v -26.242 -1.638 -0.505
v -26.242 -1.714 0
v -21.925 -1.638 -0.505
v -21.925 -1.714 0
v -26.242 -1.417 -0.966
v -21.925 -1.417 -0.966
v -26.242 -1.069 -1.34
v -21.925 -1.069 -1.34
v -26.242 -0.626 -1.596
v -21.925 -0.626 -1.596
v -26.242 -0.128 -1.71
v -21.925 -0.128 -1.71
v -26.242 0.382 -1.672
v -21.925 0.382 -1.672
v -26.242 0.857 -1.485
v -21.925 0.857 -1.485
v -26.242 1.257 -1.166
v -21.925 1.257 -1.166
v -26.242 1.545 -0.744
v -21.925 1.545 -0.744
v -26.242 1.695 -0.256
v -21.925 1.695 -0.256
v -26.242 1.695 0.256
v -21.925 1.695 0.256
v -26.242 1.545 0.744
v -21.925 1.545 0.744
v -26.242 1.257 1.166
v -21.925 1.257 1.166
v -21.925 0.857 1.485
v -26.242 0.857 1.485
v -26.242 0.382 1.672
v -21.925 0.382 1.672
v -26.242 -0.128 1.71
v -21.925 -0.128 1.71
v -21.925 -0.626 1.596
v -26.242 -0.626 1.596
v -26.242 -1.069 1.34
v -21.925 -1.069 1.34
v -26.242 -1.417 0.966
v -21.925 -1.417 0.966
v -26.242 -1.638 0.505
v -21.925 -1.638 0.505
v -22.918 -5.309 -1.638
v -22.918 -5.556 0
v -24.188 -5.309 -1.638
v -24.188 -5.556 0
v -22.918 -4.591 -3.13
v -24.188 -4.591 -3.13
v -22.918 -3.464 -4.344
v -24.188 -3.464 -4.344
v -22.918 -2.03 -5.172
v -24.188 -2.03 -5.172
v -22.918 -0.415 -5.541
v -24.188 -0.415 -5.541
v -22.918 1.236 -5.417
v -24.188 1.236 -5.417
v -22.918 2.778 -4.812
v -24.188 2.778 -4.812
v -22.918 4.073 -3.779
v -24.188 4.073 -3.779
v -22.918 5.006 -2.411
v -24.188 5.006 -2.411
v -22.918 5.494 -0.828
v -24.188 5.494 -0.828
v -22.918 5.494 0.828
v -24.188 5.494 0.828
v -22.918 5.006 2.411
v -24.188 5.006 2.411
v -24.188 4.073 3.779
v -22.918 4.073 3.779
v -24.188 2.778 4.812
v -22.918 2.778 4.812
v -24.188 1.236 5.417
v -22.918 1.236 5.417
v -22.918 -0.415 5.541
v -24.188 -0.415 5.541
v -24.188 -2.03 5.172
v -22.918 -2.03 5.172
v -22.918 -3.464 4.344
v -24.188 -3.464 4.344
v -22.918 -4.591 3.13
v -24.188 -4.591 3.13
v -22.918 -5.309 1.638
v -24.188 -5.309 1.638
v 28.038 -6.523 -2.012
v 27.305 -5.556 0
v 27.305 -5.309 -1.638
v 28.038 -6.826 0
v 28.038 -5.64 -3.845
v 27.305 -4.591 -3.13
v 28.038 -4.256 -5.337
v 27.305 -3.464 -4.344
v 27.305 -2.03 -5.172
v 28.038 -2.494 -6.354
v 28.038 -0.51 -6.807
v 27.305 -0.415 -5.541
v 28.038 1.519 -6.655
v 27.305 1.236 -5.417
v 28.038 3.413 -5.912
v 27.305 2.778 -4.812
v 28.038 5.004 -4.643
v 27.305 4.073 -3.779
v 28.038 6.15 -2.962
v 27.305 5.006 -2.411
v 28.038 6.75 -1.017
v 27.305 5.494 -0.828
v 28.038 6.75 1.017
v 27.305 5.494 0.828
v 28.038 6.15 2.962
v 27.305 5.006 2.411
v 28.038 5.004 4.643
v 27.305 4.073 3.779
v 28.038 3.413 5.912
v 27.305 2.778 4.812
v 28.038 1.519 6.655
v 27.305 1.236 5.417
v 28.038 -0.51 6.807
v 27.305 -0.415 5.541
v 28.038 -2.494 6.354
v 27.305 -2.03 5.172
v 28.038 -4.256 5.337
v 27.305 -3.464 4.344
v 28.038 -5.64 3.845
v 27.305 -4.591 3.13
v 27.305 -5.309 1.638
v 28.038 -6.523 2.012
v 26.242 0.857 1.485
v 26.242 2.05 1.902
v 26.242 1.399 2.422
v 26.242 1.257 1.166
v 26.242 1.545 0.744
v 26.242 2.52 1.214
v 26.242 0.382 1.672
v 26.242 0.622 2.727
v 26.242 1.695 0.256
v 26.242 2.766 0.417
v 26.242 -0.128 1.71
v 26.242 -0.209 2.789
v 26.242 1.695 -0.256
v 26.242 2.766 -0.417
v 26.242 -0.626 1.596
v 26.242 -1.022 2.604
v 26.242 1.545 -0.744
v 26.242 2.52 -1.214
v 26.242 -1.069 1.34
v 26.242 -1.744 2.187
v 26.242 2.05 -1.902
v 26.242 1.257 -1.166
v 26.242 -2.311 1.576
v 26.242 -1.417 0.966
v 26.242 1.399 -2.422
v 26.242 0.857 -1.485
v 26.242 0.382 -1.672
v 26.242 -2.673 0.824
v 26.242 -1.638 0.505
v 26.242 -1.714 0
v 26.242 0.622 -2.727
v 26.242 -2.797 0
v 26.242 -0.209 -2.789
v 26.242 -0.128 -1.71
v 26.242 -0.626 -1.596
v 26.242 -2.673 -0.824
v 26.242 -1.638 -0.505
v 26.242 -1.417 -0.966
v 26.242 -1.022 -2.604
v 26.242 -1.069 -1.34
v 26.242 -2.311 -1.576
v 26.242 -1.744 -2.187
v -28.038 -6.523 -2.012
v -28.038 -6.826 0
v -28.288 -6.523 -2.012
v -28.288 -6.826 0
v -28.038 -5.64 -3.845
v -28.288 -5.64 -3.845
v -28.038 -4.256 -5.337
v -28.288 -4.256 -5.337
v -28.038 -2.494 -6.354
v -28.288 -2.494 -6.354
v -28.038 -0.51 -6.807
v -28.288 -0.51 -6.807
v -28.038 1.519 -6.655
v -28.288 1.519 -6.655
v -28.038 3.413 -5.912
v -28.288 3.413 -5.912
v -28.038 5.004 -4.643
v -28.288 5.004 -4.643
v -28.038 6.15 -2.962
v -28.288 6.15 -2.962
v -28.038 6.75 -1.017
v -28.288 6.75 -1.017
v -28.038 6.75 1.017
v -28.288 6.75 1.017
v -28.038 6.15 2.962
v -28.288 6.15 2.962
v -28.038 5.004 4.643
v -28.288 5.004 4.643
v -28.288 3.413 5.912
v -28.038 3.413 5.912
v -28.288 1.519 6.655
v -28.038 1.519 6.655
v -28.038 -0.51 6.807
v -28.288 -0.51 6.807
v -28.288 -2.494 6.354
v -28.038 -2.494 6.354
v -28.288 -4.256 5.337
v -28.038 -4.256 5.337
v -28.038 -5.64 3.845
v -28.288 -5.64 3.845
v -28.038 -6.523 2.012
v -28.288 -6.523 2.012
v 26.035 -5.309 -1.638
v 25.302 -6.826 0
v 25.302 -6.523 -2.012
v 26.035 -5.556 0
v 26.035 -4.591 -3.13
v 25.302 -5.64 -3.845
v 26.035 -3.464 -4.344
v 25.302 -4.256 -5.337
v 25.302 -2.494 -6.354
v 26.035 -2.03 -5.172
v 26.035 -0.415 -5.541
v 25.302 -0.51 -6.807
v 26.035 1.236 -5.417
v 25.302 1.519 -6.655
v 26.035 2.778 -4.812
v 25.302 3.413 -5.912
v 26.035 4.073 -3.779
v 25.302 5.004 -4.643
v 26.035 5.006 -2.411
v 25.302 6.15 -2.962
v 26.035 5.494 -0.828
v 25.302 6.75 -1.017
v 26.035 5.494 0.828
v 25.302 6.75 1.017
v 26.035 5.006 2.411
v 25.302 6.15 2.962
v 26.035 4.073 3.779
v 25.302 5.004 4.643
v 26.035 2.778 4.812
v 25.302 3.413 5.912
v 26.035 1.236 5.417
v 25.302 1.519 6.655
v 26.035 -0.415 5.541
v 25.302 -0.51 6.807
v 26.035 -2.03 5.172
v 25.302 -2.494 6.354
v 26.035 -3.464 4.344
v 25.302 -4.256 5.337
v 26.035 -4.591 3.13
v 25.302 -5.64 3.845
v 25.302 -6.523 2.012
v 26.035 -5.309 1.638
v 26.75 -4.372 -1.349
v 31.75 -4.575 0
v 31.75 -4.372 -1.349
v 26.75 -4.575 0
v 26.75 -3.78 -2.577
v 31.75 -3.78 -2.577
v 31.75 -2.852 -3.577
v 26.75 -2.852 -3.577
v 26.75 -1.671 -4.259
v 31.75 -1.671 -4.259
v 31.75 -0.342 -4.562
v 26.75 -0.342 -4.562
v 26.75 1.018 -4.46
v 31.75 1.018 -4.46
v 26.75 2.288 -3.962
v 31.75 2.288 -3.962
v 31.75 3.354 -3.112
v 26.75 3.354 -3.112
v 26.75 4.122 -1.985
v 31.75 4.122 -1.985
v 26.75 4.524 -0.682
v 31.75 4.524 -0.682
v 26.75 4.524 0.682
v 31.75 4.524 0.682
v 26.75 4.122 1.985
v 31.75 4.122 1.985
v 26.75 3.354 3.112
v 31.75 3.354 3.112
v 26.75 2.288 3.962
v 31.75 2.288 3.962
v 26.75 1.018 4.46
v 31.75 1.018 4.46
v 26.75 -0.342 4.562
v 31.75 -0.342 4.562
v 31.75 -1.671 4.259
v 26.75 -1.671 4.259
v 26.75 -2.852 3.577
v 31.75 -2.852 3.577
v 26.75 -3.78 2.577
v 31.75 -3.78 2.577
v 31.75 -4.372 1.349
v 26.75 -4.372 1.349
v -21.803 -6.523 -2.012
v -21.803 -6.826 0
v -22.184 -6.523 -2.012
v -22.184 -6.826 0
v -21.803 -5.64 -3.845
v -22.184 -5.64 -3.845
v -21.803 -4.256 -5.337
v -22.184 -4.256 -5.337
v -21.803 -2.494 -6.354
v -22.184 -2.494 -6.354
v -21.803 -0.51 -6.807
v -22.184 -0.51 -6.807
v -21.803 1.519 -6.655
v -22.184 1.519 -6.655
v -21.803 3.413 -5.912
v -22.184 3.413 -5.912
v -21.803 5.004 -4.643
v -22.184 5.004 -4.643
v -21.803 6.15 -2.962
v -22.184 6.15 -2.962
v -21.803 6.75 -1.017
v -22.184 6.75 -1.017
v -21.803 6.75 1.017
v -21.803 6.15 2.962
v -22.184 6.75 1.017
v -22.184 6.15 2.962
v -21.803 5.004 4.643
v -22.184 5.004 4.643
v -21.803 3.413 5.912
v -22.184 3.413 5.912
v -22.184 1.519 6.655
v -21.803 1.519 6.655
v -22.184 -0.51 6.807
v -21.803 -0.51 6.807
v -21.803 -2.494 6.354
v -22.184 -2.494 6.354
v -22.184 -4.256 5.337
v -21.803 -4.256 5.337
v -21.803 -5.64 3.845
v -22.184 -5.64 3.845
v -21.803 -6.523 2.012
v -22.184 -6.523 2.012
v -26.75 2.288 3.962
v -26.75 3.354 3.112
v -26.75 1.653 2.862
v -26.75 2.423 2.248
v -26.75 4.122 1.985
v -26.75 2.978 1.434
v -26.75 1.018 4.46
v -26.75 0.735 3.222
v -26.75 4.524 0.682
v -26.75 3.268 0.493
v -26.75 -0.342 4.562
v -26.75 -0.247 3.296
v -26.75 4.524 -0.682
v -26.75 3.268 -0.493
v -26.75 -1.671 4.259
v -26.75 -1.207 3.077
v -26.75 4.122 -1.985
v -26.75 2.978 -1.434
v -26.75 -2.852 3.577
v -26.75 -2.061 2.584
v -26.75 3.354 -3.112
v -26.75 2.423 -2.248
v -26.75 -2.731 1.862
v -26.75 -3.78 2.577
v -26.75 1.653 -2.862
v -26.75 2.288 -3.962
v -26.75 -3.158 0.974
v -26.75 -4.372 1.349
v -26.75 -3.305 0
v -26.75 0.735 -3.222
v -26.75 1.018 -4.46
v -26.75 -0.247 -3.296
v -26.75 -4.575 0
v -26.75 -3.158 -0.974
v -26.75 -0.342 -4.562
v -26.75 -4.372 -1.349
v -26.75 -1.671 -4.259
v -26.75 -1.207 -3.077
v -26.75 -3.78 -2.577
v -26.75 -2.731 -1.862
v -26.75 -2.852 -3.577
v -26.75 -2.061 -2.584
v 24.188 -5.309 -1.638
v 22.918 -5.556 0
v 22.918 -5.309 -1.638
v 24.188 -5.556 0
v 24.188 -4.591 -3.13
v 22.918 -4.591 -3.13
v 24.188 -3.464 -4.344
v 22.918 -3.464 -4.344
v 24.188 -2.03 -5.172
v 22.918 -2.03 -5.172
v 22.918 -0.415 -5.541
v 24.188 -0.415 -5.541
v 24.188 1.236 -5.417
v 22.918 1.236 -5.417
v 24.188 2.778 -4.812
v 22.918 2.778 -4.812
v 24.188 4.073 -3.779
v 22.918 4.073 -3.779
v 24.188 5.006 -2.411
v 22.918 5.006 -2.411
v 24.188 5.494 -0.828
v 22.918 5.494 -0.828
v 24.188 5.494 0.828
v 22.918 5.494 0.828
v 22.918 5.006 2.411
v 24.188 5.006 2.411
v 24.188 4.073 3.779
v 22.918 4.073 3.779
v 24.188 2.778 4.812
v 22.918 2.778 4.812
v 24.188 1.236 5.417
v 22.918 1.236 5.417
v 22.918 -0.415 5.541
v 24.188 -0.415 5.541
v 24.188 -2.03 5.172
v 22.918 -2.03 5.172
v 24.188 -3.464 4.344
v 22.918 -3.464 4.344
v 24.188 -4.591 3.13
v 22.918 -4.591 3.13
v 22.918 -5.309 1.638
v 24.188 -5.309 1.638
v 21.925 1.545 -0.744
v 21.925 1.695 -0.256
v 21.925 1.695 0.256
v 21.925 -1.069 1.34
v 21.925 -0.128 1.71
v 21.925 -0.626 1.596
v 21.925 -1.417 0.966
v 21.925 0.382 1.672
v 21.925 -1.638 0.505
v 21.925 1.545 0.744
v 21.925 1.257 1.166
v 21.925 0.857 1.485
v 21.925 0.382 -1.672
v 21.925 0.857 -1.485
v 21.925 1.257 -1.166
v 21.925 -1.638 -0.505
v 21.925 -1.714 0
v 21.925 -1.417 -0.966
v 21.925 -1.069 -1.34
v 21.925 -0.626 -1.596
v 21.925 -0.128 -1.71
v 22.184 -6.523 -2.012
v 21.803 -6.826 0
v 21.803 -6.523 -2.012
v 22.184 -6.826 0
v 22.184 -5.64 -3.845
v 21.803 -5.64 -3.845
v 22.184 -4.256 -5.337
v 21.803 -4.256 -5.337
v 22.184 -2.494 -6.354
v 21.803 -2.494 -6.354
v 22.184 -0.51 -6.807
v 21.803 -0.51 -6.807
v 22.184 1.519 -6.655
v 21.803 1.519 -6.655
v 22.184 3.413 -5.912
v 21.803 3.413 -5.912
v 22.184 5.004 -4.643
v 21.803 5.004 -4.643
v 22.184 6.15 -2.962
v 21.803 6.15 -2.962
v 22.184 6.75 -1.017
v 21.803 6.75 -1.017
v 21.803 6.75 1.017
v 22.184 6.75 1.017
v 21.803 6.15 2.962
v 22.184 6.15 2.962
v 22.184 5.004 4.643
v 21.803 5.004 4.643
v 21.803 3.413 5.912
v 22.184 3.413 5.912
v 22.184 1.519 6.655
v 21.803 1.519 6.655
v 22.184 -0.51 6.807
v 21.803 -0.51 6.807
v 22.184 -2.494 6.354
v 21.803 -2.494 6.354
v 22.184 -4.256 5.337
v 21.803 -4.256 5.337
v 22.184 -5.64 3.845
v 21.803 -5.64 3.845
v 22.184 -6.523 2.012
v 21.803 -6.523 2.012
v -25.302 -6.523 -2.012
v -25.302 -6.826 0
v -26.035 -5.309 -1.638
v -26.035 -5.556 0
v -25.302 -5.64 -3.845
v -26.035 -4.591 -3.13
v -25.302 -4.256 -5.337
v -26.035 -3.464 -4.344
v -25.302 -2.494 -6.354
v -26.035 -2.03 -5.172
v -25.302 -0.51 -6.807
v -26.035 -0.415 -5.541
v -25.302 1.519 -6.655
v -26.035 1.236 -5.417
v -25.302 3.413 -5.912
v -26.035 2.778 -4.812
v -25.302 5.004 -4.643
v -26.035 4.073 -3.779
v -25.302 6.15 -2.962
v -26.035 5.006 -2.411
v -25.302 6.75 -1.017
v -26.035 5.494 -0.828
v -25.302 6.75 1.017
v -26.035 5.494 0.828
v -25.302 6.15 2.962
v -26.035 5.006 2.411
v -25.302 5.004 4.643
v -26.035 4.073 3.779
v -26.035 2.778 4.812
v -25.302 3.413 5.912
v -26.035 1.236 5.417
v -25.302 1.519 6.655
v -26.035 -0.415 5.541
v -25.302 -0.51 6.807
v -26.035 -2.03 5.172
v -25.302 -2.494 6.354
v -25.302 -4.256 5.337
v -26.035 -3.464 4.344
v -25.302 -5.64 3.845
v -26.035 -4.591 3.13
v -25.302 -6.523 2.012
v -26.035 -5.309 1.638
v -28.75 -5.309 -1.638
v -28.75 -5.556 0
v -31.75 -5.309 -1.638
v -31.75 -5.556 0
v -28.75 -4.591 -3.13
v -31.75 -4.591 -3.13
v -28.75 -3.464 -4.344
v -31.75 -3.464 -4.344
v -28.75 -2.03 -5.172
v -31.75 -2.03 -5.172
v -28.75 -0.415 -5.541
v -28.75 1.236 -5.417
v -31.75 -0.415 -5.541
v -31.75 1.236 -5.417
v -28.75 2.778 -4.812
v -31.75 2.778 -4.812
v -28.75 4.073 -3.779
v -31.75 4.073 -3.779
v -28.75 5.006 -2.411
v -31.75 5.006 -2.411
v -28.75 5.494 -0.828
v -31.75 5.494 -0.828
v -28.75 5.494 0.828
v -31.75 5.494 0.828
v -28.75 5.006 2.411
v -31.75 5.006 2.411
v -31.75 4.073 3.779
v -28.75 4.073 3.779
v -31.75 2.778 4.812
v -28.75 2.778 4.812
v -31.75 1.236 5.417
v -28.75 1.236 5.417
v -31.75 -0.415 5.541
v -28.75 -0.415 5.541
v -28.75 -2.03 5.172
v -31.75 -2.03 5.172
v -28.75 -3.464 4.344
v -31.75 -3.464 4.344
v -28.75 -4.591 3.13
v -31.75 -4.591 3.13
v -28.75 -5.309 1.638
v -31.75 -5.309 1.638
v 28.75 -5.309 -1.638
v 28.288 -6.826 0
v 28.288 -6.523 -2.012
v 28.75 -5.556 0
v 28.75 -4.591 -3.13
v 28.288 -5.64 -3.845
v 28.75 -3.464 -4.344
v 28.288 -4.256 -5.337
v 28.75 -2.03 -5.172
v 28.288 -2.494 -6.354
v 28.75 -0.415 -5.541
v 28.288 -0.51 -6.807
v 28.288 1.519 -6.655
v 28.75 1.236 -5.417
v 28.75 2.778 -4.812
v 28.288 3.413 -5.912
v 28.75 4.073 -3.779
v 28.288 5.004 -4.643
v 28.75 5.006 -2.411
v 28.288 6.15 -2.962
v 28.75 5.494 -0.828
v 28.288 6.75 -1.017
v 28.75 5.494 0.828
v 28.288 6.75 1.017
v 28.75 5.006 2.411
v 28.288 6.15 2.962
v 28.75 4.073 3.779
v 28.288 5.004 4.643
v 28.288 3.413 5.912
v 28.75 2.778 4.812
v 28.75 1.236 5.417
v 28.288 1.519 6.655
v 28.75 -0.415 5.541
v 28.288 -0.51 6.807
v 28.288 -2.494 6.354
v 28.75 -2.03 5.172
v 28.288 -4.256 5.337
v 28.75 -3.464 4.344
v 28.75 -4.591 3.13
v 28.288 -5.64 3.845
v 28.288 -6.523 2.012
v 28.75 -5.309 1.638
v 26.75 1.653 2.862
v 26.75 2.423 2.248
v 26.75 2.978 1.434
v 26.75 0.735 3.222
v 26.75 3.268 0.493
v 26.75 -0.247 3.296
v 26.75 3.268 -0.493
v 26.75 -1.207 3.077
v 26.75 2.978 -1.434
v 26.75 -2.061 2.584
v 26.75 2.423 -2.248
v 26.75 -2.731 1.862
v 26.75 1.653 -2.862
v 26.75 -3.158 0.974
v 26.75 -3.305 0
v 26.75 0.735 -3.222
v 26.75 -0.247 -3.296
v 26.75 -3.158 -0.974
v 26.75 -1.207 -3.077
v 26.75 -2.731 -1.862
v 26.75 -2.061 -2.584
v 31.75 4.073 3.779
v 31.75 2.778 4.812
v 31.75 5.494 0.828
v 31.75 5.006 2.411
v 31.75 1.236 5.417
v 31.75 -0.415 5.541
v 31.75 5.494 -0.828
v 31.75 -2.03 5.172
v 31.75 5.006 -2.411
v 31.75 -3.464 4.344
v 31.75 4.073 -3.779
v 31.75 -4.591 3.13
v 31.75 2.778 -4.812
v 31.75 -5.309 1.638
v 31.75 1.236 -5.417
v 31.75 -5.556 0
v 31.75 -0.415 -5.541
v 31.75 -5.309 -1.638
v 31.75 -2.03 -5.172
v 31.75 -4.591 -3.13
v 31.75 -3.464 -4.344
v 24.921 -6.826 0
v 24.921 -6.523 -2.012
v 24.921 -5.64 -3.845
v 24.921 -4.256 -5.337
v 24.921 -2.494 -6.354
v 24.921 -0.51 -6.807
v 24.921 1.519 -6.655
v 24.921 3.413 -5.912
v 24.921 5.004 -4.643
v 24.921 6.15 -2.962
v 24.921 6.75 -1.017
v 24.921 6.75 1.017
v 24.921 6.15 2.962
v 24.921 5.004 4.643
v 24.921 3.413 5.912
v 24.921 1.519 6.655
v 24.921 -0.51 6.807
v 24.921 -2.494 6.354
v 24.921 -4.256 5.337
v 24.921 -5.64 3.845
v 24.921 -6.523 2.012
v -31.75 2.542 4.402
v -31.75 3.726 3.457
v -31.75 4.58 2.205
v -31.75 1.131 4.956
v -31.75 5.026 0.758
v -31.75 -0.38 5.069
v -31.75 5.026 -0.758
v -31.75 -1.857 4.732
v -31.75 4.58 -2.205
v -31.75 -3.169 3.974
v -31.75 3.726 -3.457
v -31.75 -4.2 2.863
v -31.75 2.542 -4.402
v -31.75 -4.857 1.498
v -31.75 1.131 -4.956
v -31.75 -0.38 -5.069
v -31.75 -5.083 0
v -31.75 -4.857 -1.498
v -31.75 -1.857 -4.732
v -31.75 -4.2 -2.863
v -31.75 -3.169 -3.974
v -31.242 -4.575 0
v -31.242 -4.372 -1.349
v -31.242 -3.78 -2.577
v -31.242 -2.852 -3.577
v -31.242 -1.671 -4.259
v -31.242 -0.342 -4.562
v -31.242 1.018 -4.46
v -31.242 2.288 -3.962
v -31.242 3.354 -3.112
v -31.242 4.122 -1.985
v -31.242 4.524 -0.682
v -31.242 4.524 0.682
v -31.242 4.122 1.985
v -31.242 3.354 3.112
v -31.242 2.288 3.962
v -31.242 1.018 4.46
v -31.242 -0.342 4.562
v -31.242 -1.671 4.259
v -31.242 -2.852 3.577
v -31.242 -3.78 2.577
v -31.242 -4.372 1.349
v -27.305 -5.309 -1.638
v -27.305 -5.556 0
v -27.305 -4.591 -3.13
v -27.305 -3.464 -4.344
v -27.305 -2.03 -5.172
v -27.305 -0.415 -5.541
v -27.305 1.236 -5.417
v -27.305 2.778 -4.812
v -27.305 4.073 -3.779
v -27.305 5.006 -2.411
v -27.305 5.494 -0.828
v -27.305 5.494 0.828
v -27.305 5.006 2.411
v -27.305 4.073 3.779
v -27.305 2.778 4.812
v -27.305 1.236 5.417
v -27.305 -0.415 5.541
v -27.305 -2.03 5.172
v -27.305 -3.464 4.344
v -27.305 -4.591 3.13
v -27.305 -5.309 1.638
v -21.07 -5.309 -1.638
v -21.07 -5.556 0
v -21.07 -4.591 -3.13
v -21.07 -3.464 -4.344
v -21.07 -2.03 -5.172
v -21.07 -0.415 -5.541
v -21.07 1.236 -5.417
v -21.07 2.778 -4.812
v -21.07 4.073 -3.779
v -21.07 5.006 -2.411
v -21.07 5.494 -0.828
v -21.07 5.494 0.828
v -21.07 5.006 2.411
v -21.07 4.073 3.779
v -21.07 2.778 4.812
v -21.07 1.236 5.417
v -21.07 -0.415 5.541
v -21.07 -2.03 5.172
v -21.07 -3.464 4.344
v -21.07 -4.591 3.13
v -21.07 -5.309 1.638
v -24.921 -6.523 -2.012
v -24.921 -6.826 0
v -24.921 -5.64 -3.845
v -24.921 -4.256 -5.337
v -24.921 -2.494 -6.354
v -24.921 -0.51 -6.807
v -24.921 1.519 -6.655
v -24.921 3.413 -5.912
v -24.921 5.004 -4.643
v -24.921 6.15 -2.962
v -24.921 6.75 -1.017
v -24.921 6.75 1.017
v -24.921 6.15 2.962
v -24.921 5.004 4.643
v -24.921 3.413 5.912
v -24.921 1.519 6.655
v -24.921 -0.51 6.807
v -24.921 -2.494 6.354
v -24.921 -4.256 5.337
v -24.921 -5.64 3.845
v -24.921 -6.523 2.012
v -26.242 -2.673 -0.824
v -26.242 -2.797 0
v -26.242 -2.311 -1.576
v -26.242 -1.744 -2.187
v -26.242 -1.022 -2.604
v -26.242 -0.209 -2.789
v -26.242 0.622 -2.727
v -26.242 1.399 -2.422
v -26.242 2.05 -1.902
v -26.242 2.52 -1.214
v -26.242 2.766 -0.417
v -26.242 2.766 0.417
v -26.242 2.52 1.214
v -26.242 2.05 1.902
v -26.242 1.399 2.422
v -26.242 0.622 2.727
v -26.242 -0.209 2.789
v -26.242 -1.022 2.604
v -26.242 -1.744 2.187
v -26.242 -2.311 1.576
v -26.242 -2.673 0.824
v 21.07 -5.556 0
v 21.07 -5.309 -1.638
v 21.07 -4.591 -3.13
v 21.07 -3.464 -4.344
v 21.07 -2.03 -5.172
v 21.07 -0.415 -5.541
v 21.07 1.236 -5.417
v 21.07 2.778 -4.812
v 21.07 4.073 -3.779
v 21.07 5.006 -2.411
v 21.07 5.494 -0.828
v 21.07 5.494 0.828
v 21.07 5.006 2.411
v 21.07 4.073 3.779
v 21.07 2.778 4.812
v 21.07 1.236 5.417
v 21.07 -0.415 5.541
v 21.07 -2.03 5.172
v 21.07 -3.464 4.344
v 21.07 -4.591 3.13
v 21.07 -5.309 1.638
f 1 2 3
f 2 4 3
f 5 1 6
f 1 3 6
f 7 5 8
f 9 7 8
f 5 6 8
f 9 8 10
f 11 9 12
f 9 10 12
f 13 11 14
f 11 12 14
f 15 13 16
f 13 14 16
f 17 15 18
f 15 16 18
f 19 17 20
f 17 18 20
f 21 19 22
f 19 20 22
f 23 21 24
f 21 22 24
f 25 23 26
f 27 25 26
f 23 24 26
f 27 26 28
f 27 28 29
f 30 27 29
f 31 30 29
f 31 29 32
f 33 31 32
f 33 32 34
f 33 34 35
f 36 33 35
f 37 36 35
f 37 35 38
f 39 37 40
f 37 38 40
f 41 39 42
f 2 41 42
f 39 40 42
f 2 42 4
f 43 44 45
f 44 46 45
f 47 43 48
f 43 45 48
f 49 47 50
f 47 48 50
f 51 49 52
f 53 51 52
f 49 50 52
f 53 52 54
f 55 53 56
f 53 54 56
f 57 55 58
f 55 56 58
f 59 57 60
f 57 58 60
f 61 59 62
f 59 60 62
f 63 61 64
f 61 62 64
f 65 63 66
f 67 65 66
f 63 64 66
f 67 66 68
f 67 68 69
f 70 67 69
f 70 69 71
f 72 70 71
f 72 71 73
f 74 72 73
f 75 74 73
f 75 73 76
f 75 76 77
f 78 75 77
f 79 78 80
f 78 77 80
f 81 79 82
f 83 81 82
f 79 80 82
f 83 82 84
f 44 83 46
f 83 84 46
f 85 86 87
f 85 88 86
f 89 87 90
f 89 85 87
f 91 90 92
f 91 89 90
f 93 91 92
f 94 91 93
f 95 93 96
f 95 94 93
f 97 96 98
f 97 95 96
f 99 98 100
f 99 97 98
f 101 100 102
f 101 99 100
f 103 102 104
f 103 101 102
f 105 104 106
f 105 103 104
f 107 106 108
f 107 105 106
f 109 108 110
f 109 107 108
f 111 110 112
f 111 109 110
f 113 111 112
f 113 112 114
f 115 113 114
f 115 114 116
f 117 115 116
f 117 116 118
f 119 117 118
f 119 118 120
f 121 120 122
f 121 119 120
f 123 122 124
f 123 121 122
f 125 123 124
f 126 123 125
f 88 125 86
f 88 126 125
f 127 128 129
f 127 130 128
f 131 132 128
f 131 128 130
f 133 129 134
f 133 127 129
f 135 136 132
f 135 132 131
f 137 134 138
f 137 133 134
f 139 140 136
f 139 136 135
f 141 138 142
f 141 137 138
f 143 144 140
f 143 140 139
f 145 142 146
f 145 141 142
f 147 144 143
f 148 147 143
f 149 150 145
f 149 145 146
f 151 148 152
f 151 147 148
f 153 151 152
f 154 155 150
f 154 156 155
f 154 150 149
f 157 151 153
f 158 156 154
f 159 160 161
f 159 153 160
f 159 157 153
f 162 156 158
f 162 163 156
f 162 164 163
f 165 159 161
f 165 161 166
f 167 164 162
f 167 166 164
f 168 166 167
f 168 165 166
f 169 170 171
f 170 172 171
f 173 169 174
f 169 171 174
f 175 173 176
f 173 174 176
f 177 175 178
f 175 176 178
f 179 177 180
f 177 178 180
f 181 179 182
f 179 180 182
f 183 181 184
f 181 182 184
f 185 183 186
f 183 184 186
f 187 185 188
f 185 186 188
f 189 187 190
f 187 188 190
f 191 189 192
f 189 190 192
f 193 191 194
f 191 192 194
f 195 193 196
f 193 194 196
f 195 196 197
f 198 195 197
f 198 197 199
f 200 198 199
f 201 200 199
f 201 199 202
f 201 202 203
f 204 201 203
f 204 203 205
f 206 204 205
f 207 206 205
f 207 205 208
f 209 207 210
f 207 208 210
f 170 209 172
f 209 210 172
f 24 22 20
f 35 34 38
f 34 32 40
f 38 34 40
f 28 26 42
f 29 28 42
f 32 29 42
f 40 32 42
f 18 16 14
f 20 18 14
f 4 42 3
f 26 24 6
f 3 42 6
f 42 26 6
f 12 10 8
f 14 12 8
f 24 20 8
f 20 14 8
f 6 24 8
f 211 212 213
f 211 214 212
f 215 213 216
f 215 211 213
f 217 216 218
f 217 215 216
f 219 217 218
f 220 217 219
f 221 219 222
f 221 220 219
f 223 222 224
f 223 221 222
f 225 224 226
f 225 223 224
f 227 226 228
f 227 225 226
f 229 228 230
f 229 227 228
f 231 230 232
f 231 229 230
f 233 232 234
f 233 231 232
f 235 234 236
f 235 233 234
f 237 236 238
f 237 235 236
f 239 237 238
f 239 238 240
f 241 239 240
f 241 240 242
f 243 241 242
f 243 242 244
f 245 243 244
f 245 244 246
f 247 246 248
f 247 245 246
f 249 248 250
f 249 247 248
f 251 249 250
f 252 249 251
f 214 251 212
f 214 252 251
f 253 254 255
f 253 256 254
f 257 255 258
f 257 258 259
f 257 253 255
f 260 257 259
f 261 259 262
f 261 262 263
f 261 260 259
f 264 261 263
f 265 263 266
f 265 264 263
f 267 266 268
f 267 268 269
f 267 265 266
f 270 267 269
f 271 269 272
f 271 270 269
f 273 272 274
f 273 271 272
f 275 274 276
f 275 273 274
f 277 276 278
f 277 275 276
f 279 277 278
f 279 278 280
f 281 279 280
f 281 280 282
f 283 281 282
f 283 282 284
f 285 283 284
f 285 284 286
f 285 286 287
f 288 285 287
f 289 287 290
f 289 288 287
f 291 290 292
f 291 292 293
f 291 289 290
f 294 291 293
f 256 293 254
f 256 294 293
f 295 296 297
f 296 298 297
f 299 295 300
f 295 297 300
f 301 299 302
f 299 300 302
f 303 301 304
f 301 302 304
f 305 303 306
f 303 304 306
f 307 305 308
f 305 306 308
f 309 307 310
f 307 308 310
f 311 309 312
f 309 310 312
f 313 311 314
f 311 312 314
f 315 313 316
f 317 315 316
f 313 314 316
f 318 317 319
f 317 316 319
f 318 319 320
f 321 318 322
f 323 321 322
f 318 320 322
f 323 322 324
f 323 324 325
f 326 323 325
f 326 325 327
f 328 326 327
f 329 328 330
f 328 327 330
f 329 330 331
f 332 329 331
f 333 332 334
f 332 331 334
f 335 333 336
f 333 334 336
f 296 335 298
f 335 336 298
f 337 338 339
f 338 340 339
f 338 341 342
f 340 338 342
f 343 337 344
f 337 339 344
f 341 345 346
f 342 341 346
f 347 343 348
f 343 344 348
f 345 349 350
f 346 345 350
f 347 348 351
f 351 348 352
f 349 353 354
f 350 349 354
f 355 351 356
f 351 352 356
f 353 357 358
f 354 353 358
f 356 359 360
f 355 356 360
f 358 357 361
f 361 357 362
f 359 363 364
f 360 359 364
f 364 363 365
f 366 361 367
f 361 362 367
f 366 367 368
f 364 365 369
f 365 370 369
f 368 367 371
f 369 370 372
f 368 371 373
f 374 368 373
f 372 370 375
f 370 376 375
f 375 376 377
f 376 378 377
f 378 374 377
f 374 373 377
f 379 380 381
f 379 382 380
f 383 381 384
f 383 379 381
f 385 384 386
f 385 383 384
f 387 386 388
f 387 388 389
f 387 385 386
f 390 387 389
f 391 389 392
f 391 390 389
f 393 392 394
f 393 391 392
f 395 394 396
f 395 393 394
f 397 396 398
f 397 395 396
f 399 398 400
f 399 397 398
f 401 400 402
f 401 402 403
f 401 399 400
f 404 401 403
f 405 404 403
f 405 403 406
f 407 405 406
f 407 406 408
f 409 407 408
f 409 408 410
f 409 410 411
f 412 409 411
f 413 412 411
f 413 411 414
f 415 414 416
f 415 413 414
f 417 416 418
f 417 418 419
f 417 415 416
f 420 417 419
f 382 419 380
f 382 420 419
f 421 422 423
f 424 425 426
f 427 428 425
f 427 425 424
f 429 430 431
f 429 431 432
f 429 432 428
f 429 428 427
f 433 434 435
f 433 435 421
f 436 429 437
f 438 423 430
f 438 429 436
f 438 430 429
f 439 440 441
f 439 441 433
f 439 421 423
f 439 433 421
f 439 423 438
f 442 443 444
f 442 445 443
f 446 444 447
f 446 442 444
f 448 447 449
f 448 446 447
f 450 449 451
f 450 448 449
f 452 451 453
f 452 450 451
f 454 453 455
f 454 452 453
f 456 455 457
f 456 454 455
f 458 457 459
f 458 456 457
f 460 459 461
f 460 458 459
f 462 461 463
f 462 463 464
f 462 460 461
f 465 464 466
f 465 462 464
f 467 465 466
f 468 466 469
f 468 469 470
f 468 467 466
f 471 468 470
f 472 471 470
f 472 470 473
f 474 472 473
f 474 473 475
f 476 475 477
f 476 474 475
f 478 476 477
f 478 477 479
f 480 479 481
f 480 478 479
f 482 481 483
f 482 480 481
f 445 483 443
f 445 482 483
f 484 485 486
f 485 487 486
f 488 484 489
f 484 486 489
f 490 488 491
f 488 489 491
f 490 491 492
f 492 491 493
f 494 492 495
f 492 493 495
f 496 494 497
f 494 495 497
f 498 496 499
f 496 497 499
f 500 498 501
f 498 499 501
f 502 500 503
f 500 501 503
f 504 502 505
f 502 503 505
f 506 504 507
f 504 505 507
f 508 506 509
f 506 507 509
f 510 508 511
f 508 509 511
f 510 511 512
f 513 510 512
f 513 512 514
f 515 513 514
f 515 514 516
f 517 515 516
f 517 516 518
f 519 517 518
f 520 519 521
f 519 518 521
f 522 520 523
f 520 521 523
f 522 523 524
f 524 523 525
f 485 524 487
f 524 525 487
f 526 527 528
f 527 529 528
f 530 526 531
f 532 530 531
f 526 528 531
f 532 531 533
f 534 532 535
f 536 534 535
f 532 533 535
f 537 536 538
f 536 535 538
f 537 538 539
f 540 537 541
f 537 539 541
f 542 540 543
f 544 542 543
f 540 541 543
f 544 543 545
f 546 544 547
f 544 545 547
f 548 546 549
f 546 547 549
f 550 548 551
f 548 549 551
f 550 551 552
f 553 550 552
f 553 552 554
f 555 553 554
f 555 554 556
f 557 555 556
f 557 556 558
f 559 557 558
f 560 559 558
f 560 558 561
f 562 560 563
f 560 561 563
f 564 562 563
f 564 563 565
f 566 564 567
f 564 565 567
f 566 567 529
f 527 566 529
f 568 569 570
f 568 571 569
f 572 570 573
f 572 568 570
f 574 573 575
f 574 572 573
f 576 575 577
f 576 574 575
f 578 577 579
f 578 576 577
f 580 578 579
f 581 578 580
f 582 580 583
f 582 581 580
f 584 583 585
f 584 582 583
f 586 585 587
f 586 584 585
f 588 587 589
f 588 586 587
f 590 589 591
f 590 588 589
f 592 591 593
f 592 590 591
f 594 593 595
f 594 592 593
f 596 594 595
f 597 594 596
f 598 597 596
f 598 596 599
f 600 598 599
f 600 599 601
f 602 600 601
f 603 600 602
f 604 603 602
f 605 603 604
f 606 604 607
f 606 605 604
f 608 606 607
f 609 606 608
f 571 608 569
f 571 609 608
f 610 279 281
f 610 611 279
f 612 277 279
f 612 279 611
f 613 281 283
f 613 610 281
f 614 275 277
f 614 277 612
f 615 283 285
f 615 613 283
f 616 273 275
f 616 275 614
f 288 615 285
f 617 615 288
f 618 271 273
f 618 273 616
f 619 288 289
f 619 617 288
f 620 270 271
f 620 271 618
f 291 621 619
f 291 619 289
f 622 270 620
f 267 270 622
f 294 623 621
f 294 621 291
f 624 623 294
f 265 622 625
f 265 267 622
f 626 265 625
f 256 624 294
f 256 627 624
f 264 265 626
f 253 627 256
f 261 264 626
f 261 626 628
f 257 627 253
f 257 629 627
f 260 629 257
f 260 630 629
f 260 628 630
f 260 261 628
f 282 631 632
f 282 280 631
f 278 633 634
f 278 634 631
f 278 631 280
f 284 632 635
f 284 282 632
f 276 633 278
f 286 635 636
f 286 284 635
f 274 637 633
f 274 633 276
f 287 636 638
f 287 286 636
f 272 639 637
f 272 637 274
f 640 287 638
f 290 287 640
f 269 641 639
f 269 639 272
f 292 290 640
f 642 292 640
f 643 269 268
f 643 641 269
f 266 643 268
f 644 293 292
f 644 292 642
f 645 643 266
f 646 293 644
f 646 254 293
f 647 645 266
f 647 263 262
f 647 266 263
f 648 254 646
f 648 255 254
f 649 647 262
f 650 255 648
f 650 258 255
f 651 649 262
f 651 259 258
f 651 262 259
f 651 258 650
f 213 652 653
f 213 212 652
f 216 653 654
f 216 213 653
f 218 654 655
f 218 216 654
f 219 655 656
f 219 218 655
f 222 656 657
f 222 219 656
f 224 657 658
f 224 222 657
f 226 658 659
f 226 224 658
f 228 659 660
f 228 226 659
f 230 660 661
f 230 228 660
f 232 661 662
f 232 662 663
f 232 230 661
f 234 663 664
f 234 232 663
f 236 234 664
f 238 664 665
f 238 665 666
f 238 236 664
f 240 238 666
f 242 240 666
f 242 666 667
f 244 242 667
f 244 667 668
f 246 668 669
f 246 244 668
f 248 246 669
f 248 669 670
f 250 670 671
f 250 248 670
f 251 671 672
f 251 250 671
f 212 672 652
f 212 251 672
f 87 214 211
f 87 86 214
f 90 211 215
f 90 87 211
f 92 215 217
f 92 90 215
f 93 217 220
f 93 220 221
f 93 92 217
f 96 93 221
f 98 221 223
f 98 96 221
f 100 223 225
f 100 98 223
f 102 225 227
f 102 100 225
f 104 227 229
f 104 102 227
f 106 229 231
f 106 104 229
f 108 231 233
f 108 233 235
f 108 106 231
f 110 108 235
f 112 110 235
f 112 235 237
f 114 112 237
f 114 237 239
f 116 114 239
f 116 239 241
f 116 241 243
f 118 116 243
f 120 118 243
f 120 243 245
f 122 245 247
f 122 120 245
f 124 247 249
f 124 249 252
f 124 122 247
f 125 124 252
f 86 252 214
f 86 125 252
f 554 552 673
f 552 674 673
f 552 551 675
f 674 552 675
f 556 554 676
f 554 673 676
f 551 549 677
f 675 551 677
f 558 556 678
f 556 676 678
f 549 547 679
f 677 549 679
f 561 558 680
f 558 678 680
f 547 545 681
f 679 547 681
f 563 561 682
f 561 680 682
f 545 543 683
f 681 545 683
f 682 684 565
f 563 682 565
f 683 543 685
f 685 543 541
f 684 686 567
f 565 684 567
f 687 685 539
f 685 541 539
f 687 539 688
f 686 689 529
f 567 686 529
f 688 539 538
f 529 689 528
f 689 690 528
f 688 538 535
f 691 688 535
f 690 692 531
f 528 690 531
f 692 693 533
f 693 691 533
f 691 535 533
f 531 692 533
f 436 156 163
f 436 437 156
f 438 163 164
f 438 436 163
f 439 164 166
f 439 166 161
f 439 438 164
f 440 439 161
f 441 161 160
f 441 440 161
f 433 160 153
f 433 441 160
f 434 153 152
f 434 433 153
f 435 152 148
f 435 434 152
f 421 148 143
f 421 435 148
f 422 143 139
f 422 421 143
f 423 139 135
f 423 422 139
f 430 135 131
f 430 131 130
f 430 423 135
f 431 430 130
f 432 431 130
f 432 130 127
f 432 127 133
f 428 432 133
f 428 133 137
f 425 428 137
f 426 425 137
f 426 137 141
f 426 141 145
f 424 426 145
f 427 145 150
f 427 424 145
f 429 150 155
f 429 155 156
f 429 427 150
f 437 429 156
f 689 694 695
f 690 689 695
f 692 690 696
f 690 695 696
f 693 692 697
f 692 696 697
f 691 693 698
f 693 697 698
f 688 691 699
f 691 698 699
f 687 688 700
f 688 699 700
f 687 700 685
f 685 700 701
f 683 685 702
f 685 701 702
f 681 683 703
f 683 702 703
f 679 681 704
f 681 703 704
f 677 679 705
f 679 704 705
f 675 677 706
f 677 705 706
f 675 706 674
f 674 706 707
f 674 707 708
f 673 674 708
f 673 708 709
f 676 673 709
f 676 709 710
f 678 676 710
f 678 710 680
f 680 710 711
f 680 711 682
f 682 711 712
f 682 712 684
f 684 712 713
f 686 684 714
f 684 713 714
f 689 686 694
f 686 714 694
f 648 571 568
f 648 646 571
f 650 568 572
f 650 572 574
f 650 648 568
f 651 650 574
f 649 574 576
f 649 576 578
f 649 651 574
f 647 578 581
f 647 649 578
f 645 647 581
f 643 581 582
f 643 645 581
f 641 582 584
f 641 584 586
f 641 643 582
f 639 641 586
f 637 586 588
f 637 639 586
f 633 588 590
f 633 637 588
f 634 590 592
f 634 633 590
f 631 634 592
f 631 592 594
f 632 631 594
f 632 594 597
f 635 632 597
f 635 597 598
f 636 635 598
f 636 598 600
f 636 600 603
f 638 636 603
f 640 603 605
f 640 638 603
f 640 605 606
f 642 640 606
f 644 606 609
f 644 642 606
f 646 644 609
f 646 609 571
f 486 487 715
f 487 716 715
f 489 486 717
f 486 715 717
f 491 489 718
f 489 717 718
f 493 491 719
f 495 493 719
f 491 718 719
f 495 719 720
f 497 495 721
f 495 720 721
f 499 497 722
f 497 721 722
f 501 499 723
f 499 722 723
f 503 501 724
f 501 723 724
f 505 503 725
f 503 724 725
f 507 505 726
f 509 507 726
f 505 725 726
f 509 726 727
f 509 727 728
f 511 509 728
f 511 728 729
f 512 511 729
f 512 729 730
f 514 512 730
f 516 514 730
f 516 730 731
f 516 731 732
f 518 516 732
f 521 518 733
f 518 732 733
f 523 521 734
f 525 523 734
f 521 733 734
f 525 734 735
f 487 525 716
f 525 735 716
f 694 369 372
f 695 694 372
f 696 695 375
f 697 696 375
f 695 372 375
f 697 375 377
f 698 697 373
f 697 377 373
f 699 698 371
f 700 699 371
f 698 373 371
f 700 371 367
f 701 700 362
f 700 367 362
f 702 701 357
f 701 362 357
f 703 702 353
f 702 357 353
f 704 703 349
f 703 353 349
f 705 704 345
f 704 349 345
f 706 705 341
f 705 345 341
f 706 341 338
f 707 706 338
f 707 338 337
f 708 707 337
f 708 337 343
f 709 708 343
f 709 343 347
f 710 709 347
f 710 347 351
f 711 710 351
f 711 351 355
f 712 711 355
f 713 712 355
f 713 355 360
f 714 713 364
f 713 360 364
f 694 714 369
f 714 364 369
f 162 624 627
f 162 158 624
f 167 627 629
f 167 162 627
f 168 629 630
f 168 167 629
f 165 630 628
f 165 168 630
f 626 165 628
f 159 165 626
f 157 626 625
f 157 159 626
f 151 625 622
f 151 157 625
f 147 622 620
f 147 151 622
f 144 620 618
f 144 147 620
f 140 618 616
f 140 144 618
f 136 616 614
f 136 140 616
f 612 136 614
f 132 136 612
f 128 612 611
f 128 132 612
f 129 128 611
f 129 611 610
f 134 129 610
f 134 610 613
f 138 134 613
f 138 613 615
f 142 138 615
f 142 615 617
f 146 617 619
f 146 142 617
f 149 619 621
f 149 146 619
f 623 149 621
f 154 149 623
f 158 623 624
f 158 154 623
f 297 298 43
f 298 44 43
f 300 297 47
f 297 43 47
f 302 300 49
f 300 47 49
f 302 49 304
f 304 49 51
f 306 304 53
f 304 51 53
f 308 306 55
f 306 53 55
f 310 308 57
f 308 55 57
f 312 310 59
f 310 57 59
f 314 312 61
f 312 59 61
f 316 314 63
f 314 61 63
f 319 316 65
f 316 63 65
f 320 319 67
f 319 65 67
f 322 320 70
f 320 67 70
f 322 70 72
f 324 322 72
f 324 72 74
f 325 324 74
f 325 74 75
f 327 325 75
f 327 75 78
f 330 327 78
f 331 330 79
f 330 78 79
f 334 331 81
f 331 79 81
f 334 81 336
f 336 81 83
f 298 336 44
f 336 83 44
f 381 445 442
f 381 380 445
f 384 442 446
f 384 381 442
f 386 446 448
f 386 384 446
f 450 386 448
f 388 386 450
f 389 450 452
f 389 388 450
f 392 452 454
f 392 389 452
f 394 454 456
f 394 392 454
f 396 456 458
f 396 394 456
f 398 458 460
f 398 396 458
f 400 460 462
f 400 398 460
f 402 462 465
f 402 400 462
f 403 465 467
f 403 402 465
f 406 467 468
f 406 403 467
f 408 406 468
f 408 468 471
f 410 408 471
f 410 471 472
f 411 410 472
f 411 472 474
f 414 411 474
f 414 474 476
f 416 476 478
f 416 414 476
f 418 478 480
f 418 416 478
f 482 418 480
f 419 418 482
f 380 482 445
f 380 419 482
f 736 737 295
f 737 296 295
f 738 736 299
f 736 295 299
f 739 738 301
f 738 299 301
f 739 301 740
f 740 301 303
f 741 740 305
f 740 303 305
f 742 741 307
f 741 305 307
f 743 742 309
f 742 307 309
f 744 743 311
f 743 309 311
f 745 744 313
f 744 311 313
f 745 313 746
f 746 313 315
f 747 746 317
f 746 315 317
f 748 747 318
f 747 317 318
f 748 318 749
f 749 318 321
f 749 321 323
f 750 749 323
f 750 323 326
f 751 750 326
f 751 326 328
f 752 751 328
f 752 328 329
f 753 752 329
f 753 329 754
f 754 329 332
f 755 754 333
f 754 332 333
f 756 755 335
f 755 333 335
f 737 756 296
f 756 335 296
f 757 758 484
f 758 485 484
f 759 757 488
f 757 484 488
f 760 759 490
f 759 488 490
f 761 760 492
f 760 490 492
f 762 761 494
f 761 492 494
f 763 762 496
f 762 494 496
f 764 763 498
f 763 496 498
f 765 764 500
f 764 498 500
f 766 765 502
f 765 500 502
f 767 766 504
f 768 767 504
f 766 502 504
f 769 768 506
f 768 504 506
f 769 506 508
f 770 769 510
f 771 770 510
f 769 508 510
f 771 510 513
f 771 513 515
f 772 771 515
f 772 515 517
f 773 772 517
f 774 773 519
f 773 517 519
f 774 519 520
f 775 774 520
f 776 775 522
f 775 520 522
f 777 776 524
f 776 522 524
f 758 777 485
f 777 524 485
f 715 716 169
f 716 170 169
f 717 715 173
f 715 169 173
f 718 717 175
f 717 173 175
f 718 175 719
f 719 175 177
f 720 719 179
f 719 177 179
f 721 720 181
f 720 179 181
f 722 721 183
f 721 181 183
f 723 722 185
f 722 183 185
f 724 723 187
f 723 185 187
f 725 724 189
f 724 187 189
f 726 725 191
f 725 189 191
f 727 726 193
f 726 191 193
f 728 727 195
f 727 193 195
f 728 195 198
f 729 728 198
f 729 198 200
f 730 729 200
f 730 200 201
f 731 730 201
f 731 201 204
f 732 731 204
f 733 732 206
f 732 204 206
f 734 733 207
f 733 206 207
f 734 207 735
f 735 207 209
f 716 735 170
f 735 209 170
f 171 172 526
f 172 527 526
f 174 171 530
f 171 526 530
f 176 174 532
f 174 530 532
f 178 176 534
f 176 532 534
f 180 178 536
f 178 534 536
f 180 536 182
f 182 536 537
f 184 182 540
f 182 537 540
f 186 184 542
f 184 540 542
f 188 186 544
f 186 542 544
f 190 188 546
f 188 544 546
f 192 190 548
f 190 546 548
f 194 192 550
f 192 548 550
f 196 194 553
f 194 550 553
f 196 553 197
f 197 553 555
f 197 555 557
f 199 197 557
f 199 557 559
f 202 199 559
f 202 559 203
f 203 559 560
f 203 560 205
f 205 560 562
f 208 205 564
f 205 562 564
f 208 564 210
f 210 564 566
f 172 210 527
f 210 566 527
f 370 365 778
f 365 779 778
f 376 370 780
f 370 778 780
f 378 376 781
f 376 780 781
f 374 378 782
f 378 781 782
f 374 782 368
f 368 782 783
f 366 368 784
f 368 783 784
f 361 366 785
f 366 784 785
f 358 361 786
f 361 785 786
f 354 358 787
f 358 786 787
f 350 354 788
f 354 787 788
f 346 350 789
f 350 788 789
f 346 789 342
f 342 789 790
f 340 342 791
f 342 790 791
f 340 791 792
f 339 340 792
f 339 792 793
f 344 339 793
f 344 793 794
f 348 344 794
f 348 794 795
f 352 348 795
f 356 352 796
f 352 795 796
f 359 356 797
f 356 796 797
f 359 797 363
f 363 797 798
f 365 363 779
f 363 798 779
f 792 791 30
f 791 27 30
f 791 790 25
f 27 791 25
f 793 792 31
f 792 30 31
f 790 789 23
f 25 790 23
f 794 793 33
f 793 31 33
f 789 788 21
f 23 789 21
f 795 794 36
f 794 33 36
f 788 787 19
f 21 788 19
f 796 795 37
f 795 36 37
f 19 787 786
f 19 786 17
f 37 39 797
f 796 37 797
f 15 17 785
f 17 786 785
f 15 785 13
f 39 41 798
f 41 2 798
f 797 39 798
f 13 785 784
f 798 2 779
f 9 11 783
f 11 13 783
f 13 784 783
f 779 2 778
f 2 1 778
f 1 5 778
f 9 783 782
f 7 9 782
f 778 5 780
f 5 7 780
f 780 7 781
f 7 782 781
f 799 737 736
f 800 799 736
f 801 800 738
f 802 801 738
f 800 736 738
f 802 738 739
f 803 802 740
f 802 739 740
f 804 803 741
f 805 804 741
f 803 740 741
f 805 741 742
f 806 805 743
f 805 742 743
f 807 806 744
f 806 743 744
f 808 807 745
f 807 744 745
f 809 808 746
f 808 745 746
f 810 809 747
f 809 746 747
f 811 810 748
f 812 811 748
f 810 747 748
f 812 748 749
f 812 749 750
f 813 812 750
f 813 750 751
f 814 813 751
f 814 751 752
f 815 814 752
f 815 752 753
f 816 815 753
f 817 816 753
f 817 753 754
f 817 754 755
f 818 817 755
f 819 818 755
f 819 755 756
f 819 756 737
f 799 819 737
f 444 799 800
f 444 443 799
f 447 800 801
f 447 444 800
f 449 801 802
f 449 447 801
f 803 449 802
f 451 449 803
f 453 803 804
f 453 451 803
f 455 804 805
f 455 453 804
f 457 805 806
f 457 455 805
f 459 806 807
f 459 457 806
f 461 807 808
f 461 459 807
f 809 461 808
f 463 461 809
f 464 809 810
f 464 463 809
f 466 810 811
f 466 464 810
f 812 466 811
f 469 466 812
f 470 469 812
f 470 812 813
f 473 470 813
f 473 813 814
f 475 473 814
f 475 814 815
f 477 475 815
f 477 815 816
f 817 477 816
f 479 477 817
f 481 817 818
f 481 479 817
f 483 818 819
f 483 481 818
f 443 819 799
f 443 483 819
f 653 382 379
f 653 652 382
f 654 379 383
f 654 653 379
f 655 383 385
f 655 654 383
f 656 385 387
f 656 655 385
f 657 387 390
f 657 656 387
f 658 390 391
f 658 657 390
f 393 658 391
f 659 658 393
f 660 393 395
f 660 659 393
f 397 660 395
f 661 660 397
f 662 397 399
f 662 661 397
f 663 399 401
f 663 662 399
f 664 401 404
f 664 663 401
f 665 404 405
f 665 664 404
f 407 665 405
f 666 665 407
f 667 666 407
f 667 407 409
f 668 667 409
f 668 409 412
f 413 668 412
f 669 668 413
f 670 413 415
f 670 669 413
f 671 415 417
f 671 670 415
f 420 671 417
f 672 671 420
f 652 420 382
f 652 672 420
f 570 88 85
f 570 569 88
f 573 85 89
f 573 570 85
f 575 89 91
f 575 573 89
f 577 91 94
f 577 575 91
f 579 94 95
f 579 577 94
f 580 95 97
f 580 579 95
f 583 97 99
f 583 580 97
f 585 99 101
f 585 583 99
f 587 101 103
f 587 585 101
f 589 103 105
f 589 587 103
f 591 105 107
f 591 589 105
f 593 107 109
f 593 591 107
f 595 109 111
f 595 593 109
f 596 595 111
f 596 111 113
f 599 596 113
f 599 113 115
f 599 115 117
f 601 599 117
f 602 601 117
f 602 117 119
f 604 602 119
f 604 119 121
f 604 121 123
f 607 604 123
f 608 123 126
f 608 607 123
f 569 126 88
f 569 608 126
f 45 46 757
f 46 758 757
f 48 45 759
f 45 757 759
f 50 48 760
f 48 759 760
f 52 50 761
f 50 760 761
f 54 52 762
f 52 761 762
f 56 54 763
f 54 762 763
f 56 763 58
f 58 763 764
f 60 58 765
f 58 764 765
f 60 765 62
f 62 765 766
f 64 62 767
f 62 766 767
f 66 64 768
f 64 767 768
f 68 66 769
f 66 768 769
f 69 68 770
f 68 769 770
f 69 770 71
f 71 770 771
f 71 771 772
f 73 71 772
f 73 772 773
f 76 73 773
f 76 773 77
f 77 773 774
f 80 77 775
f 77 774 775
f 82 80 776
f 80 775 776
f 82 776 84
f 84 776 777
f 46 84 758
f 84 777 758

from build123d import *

# Parameters (mm, degrees)
CHAMFER1_SIZE = 0.508


with BuildPart() as part:
    # Sketch2 → Revolve1 (revolve)
    with BuildSketch(Plane.XY, mode=Mode.PRIVATE) as revolve1_sk:
        Polygon((-28.75, 5.55625), (-31.75, 5.55625), (-31.75, 4.575), (-26.75, 4.575), (-26.75, 3.305), (-26.242, 2.797), (-26.242, 1.7145), (-21.925, 1.7145), (-21.925, 0), (0, 0), (0, 3.175), (0, 5.55625), (-21.070060633, 5.55625), (-21.803295474, 6.82625), (-22.184295474, 6.82625), (-22.917530316, 5.55625), (-24.187530316, 5.55625), (-24.920765158, 6.82625), (-25.301765158, 6.82625), (-26.035, 5.55625), (-27.305, 5.55625), (-28.038234842, 6.82625), (-28.287757802, 6.82625), align=None)
    revolve(revolve1_sk.sketch.rotate(Axis((-31.75, 0, 0), (1, 0, 0)), 180), axis=Axis((-31.75, 0, 0), (1, 0, 0)))

    # Mirror1: part across plane


with BuildPart() as part_1:
    add(part.part)
    add(part.part.mirror(Plane(origin=(0, 0, 0), x_dir=(0, 0, 1), z_dir=(1, 0, 0))))

    # Chamfer1
    chamfer1_edges = [part_1.edges().sort_by_distance(p)[0] for p in [
        (-31.75, 4.575, 0),
    ]]
    chamfer(chamfer1_edges, length=CHAMFER1_SIZE)


solid = part_1.part
